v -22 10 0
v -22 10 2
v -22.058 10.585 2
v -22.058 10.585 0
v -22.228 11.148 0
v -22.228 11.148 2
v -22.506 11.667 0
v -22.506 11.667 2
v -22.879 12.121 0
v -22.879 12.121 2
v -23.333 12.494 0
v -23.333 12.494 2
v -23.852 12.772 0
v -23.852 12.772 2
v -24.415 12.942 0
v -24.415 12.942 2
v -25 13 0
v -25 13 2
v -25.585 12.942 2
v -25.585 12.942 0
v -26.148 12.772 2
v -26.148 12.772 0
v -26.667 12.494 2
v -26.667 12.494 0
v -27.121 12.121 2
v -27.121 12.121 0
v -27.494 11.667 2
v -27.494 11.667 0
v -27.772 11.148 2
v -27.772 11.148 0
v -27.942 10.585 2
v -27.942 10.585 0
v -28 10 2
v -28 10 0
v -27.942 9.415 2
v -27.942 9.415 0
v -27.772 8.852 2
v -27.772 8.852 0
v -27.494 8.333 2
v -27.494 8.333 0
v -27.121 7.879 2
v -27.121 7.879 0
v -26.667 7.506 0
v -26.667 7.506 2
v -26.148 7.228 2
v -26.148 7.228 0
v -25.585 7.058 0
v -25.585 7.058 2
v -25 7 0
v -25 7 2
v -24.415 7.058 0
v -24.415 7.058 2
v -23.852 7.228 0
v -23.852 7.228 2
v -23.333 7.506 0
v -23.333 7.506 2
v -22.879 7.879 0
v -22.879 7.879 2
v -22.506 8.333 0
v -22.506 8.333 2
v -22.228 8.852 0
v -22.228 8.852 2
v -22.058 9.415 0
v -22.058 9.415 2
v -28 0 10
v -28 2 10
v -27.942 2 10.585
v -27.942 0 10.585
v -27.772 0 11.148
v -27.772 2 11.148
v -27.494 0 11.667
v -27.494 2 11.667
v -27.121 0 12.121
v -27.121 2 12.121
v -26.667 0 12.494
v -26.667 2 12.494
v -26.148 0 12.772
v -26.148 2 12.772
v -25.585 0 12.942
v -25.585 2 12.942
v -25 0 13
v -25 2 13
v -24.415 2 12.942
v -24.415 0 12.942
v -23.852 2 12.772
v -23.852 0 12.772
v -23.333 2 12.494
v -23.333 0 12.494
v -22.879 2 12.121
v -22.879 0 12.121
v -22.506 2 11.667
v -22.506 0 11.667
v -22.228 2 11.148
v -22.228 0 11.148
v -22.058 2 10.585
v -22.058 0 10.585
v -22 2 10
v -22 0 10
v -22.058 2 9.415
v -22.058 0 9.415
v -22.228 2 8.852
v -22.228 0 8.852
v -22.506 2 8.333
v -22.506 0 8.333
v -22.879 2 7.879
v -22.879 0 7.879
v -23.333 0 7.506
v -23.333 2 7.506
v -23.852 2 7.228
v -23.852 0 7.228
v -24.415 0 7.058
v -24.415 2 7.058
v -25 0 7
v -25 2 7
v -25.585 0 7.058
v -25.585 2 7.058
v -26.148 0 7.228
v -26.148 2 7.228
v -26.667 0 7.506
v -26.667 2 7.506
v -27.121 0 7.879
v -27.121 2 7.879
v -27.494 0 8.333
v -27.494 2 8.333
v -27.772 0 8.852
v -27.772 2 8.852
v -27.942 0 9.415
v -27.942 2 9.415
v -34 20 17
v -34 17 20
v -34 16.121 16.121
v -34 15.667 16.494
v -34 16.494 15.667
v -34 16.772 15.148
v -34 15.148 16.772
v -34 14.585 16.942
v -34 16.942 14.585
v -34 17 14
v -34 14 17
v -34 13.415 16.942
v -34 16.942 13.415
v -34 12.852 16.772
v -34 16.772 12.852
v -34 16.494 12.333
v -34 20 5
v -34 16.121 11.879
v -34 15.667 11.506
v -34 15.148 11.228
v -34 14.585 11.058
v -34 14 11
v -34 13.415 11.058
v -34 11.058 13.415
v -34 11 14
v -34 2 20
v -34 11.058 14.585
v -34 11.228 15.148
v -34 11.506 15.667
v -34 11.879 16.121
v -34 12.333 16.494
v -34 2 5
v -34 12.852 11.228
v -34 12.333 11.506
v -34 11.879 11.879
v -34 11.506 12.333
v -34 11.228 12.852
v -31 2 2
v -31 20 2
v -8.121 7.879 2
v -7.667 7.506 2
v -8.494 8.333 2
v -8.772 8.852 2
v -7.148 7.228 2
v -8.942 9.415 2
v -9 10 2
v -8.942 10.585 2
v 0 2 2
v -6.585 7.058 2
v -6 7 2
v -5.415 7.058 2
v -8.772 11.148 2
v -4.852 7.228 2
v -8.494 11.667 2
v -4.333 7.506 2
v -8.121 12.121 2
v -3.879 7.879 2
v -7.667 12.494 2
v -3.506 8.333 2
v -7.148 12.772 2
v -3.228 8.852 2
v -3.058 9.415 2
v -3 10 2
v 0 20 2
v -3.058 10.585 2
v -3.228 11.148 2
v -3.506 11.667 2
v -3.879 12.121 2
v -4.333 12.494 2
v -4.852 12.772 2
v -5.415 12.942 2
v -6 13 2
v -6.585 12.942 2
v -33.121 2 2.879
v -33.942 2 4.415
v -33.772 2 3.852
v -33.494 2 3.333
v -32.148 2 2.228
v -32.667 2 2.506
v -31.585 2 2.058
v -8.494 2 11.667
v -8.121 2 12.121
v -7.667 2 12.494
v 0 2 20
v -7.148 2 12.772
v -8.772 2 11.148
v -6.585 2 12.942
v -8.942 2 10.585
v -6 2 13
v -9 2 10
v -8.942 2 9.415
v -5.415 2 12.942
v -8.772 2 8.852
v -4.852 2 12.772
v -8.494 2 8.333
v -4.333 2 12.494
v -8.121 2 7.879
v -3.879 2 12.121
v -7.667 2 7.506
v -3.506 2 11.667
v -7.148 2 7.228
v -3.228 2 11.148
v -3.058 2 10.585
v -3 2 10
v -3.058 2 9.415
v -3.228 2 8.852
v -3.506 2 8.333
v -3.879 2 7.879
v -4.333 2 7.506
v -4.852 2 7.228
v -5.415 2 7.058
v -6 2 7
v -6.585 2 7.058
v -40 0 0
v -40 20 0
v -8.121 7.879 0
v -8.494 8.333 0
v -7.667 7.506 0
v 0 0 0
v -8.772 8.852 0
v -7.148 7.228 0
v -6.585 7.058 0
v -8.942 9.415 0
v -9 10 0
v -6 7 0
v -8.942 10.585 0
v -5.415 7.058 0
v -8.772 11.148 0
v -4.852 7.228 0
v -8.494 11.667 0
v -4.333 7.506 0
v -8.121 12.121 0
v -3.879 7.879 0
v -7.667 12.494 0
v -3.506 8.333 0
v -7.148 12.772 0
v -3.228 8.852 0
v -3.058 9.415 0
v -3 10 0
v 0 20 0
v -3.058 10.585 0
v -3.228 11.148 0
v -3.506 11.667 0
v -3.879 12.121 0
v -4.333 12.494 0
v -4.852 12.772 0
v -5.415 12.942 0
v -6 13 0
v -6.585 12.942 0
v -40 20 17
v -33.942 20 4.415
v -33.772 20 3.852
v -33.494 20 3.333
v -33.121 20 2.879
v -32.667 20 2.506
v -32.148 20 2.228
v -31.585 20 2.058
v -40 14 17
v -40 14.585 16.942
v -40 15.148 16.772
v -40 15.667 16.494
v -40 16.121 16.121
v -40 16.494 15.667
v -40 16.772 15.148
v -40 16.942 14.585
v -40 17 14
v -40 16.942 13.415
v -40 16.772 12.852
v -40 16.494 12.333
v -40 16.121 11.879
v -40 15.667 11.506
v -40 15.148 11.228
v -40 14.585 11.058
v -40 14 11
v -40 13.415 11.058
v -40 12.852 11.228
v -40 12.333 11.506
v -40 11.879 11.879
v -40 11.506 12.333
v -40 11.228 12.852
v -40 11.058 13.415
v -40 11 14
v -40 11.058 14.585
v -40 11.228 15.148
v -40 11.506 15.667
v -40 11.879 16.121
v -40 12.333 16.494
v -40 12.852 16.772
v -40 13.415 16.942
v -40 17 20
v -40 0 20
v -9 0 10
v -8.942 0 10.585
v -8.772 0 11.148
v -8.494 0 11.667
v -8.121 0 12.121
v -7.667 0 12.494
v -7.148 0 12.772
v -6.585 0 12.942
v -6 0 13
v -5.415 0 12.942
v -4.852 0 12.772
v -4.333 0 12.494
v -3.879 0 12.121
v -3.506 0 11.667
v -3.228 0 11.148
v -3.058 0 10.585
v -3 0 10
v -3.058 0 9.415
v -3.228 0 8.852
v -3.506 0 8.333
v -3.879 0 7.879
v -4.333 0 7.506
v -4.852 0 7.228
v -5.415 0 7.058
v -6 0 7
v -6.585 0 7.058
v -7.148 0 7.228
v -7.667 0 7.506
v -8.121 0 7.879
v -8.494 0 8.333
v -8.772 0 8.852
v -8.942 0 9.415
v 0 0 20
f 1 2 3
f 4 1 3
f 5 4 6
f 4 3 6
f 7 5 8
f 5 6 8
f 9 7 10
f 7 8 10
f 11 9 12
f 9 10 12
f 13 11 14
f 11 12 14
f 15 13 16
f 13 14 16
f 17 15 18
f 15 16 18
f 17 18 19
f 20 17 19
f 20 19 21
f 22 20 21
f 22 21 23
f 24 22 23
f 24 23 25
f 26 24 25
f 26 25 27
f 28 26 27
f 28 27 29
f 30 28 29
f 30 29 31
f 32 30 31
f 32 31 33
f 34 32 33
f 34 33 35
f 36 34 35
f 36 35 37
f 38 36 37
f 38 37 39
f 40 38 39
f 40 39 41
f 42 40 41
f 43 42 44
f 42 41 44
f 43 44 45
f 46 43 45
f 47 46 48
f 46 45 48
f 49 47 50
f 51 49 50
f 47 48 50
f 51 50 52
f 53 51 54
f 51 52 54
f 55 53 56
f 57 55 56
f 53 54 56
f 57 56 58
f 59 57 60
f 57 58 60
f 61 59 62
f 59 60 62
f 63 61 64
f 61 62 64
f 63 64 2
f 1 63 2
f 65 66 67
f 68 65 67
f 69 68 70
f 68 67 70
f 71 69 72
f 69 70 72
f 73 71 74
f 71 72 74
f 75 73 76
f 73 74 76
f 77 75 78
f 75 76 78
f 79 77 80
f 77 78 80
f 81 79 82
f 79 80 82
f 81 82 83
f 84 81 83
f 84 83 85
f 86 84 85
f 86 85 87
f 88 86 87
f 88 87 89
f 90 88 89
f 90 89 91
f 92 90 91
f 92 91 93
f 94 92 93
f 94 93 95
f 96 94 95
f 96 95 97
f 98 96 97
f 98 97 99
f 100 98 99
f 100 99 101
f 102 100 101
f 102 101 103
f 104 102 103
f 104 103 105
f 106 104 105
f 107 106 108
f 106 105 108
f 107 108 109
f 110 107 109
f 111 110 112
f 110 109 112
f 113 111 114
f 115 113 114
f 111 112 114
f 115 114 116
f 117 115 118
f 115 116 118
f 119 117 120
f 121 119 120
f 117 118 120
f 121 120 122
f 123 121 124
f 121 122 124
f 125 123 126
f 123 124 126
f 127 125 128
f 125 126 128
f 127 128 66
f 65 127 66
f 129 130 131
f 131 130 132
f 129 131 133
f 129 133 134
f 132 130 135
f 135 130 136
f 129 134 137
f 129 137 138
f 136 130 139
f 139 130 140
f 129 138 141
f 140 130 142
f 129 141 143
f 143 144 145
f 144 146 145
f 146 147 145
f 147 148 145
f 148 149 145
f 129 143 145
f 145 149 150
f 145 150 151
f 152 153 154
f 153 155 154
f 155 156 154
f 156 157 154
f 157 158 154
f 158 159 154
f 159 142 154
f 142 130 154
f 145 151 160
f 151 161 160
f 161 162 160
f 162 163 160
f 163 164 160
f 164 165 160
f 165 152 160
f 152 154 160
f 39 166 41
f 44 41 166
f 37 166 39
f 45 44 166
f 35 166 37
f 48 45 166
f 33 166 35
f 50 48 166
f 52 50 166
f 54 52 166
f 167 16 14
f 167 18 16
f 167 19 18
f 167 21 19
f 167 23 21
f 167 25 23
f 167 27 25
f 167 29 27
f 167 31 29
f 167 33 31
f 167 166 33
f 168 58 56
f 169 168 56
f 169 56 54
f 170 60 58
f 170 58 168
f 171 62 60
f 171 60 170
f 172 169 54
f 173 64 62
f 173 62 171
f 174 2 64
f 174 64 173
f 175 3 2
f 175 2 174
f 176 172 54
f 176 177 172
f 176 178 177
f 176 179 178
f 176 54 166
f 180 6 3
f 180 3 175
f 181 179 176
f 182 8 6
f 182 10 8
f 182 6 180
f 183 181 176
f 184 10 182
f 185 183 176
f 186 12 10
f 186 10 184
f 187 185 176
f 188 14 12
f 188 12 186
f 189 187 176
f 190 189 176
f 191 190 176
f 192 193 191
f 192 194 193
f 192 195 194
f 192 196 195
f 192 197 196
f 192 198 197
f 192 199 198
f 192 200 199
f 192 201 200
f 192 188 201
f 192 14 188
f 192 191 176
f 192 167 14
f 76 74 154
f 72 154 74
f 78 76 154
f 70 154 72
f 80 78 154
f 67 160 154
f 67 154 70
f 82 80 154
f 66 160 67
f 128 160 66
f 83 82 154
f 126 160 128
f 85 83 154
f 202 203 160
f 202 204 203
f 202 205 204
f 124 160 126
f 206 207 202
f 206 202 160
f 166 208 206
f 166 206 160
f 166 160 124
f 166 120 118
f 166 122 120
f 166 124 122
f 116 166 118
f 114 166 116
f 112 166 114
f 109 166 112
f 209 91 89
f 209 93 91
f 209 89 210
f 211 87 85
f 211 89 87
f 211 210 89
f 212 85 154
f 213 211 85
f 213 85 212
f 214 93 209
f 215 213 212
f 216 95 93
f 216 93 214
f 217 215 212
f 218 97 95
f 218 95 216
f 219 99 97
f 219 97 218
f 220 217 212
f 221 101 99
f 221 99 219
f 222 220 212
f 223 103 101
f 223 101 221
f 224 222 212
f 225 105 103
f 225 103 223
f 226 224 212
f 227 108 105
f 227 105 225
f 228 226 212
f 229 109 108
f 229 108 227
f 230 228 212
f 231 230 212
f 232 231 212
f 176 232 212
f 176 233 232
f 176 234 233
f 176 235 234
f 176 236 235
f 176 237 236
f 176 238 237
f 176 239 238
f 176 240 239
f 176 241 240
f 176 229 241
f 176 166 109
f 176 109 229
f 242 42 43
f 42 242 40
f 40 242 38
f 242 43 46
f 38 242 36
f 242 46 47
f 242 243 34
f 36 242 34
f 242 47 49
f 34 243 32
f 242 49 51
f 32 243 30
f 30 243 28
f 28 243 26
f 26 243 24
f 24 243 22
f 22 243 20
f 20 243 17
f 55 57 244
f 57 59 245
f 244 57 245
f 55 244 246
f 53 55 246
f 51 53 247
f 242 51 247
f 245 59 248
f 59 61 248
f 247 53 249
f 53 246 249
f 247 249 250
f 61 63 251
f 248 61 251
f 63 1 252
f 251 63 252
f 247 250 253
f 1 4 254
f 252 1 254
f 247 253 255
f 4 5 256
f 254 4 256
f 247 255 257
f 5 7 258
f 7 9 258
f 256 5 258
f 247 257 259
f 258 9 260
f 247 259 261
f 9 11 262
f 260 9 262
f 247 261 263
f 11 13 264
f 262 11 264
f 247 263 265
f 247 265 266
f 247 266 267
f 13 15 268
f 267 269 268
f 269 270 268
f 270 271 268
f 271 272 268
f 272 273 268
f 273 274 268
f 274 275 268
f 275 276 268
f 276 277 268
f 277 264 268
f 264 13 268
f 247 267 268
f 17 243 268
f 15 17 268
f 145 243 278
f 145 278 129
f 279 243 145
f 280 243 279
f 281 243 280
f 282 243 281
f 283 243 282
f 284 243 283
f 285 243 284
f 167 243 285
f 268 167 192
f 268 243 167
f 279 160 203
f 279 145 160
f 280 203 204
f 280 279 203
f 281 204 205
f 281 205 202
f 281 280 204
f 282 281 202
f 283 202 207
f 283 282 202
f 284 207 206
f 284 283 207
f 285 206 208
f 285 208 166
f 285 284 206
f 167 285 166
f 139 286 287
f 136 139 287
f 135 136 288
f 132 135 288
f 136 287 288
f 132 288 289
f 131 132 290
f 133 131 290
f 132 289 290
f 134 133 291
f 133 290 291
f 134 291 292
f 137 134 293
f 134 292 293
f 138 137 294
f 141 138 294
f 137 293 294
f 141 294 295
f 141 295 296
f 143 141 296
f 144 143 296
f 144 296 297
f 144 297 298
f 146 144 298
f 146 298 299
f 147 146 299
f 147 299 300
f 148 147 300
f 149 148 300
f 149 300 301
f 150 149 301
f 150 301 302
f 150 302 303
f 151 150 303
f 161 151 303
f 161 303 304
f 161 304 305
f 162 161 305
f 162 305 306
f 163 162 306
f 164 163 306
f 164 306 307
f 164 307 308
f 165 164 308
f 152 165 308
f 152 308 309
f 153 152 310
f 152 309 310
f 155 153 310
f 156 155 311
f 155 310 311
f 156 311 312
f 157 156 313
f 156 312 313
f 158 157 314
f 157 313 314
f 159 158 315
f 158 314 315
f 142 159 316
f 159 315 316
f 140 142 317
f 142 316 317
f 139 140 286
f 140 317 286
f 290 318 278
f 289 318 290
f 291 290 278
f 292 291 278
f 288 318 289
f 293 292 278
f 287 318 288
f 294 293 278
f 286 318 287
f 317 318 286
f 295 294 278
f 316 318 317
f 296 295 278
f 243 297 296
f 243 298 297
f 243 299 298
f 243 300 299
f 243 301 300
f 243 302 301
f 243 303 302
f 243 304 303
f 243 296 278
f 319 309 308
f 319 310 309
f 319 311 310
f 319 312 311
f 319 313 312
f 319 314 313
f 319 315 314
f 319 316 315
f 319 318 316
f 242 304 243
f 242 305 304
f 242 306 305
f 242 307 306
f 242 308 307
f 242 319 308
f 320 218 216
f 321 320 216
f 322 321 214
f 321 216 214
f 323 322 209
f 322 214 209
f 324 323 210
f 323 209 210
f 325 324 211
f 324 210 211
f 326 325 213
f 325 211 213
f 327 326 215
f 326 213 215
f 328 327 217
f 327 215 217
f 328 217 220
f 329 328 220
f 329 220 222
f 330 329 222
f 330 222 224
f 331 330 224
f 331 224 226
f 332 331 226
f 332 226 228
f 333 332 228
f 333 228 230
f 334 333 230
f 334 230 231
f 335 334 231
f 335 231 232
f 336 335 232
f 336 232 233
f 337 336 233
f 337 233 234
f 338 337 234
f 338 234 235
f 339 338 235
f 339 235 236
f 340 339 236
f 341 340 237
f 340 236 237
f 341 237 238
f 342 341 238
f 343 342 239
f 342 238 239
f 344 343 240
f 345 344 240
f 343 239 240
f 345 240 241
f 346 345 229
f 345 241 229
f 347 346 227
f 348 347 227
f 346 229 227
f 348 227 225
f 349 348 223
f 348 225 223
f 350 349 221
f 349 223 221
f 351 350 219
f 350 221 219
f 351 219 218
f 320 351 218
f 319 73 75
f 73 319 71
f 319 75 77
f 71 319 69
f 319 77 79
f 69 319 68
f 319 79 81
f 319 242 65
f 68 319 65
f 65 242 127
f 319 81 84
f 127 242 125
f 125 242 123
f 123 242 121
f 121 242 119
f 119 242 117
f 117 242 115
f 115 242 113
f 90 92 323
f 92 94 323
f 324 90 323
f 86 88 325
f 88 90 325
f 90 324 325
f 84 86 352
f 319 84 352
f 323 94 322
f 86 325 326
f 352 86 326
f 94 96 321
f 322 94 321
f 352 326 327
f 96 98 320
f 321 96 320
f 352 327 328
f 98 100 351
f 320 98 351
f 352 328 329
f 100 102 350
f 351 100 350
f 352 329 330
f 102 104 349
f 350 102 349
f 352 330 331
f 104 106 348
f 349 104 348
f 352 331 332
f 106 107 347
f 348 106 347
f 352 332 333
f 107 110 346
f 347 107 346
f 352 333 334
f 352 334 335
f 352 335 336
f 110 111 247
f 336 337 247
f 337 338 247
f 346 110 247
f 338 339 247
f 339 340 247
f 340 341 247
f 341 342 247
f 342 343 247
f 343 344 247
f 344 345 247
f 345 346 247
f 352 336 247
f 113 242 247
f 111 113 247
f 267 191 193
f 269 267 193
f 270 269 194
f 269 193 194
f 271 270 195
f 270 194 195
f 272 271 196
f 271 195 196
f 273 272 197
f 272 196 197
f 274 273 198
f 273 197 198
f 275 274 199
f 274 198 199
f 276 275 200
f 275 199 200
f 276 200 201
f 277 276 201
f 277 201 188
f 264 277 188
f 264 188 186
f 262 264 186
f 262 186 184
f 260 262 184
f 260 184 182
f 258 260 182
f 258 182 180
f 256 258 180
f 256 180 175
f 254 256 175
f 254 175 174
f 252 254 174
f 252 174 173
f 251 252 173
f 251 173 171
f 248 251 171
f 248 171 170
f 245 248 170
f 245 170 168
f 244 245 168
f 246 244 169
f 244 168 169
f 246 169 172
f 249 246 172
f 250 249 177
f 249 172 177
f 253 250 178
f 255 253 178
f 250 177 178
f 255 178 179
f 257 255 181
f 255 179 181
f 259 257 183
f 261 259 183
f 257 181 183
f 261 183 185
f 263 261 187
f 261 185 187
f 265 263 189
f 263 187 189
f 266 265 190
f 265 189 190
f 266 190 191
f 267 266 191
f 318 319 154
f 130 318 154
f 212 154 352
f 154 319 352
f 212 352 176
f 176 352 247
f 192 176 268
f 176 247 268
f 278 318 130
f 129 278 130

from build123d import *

# Parameters (mm, degrees)
ESQUISSE1_W             = 40
ESQUISSE1_H             = 20
BOSS_EXTRU_1_DEPTH      = 2
ESQUISSE2_W             = 40
ESQUISSE2_H             = 2
BOSS_EXTRU_2_DEPTH      = 18
ESQUISSE3_R             = 3
ENL_V_MAT_EXTRU_1_DEPTH = 18
ESQUISSE4_R             = 3
ENL_V_MAT_EXTRU_2_DEPTH = 18
ESQUISSE5_R             = 3
ENL_V_MAT_EXTRU_3_DEPTH = 18
ESQUISSE6_R             = 3
ENL_V_MAT_EXTRU_4_DEPTH = 18
ESQUISSE7_W             = 6
ESQUISSE7_H             = 18
BOSS_EXTRU_3_DEPTH      = 18
ESQUISSE8_R             = 3
ENL_V_MAT_EXTRU_5_DEPTH = 18
CHANFREIN1_SIZE         = 3
CONG_1_R                = 3


with BuildPart() as part:
    # Esquisse1 → Boss.-Extru.1 (new body)
    with BuildSketch(Plane.XY):
        with Locations((-20, 10)):
            Rectangle(ESQUISSE1_W, ESQUISSE1_H)
    extrude(amount=BOSS_EXTRU_1_DEPTH)

    # Esquisse2 → Boss.-Extru.2 (add)
    with BuildSketch(Plane.XY.offset(2)):
        with Locations((-20, 1)):
            Rectangle(ESQUISSE2_W, ESQUISSE2_H)
    extrude(amount=BOSS_EXTRU_2_DEPTH)

    # Esquisse3 → Enlèv. mat.-Extru.1 (cut)
    with BuildSketch(Plane.XY.offset(2)):
        with Locations((-6, 10)):
            Circle(ESQUISSE3_R)
    extrude(amount=-ENL_V_MAT_EXTRU_1_DEPTH, mode=Mode.SUBTRACT)

    # Esquisse4 → Enlèv. mat.-Extru.2 (cut)
    with BuildSketch(Plane.XY.offset(2)):
        with Locations((-25, 10)):
            Circle(ESQUISSE4_R)
    extrude(amount=-ENL_V_MAT_EXTRU_2_DEPTH, mode=Mode.SUBTRACT)

    # Esquisse5 → Enlèv. mat.-Extru.3 (cut)
    with BuildSketch(Plane(origin=(0, 2, 0), x_dir=(1, 0, 0), z_dir=(0, 1, 0))):
        with Locations(Location((-6, -10, 0), (0, 0, 180))):  # turned: the seam where the file's is
            Circle(ESQUISSE5_R)
    extrude(amount=-ENL_V_MAT_EXTRU_3_DEPTH, mode=Mode.SUBTRACT)

    # Esquisse6 → Enlèv. mat.-Extru.4 (cut)
    with BuildSketch(Plane(origin=(0, 2, 0), x_dir=(1, 0, 0), z_dir=(0, 1, 0))):
        with Locations(Location((-25, -10, 0), (0, 0, 180))):  # turned: the seam where the file's is
            Circle(ESQUISSE6_R)
    extrude(amount=-ENL_V_MAT_EXTRU_4_DEPTH, mode=Mode.SUBTRACT)

    # Esquisse7 → Boss.-Extru.3 (add)
    with BuildSketch(Plane(origin=(0, 2, 0), x_dir=(1, 0, 0), z_dir=(0, 1, 0))):
        with Locations((-37, -11)):
            Rectangle(ESQUISSE7_W, ESQUISSE7_H)
    extrude(amount=BOSS_EXTRU_3_DEPTH)

    # Esquisse8 → Enlèv. mat.-Extru.5 (cut)
    with BuildSketch(Plane.ZY.offset(40)):
        with Locations((14, 14)):
            Circle(ESQUISSE8_R)
    extrude(amount=-ENL_V_MAT_EXTRU_5_DEPTH, mode=Mode.SUBTRACT)

    # Chanfrein1
    chanfrein1_edges = [part.edges().sort_by_distance(p)[0] for p in [
        (-37, 20, 20),
    ]]
    chamfer(chanfrein1_edges, length=CHANFREIN1_SIZE)

    # Congé1
    cong_1_edges = [part.edges().sort_by_distance(p)[0] for p in [
        (-34, 11, 2),
    ]]
    fillet(cong_1_edges, radius=CONG_1_R)


solid = part.part
